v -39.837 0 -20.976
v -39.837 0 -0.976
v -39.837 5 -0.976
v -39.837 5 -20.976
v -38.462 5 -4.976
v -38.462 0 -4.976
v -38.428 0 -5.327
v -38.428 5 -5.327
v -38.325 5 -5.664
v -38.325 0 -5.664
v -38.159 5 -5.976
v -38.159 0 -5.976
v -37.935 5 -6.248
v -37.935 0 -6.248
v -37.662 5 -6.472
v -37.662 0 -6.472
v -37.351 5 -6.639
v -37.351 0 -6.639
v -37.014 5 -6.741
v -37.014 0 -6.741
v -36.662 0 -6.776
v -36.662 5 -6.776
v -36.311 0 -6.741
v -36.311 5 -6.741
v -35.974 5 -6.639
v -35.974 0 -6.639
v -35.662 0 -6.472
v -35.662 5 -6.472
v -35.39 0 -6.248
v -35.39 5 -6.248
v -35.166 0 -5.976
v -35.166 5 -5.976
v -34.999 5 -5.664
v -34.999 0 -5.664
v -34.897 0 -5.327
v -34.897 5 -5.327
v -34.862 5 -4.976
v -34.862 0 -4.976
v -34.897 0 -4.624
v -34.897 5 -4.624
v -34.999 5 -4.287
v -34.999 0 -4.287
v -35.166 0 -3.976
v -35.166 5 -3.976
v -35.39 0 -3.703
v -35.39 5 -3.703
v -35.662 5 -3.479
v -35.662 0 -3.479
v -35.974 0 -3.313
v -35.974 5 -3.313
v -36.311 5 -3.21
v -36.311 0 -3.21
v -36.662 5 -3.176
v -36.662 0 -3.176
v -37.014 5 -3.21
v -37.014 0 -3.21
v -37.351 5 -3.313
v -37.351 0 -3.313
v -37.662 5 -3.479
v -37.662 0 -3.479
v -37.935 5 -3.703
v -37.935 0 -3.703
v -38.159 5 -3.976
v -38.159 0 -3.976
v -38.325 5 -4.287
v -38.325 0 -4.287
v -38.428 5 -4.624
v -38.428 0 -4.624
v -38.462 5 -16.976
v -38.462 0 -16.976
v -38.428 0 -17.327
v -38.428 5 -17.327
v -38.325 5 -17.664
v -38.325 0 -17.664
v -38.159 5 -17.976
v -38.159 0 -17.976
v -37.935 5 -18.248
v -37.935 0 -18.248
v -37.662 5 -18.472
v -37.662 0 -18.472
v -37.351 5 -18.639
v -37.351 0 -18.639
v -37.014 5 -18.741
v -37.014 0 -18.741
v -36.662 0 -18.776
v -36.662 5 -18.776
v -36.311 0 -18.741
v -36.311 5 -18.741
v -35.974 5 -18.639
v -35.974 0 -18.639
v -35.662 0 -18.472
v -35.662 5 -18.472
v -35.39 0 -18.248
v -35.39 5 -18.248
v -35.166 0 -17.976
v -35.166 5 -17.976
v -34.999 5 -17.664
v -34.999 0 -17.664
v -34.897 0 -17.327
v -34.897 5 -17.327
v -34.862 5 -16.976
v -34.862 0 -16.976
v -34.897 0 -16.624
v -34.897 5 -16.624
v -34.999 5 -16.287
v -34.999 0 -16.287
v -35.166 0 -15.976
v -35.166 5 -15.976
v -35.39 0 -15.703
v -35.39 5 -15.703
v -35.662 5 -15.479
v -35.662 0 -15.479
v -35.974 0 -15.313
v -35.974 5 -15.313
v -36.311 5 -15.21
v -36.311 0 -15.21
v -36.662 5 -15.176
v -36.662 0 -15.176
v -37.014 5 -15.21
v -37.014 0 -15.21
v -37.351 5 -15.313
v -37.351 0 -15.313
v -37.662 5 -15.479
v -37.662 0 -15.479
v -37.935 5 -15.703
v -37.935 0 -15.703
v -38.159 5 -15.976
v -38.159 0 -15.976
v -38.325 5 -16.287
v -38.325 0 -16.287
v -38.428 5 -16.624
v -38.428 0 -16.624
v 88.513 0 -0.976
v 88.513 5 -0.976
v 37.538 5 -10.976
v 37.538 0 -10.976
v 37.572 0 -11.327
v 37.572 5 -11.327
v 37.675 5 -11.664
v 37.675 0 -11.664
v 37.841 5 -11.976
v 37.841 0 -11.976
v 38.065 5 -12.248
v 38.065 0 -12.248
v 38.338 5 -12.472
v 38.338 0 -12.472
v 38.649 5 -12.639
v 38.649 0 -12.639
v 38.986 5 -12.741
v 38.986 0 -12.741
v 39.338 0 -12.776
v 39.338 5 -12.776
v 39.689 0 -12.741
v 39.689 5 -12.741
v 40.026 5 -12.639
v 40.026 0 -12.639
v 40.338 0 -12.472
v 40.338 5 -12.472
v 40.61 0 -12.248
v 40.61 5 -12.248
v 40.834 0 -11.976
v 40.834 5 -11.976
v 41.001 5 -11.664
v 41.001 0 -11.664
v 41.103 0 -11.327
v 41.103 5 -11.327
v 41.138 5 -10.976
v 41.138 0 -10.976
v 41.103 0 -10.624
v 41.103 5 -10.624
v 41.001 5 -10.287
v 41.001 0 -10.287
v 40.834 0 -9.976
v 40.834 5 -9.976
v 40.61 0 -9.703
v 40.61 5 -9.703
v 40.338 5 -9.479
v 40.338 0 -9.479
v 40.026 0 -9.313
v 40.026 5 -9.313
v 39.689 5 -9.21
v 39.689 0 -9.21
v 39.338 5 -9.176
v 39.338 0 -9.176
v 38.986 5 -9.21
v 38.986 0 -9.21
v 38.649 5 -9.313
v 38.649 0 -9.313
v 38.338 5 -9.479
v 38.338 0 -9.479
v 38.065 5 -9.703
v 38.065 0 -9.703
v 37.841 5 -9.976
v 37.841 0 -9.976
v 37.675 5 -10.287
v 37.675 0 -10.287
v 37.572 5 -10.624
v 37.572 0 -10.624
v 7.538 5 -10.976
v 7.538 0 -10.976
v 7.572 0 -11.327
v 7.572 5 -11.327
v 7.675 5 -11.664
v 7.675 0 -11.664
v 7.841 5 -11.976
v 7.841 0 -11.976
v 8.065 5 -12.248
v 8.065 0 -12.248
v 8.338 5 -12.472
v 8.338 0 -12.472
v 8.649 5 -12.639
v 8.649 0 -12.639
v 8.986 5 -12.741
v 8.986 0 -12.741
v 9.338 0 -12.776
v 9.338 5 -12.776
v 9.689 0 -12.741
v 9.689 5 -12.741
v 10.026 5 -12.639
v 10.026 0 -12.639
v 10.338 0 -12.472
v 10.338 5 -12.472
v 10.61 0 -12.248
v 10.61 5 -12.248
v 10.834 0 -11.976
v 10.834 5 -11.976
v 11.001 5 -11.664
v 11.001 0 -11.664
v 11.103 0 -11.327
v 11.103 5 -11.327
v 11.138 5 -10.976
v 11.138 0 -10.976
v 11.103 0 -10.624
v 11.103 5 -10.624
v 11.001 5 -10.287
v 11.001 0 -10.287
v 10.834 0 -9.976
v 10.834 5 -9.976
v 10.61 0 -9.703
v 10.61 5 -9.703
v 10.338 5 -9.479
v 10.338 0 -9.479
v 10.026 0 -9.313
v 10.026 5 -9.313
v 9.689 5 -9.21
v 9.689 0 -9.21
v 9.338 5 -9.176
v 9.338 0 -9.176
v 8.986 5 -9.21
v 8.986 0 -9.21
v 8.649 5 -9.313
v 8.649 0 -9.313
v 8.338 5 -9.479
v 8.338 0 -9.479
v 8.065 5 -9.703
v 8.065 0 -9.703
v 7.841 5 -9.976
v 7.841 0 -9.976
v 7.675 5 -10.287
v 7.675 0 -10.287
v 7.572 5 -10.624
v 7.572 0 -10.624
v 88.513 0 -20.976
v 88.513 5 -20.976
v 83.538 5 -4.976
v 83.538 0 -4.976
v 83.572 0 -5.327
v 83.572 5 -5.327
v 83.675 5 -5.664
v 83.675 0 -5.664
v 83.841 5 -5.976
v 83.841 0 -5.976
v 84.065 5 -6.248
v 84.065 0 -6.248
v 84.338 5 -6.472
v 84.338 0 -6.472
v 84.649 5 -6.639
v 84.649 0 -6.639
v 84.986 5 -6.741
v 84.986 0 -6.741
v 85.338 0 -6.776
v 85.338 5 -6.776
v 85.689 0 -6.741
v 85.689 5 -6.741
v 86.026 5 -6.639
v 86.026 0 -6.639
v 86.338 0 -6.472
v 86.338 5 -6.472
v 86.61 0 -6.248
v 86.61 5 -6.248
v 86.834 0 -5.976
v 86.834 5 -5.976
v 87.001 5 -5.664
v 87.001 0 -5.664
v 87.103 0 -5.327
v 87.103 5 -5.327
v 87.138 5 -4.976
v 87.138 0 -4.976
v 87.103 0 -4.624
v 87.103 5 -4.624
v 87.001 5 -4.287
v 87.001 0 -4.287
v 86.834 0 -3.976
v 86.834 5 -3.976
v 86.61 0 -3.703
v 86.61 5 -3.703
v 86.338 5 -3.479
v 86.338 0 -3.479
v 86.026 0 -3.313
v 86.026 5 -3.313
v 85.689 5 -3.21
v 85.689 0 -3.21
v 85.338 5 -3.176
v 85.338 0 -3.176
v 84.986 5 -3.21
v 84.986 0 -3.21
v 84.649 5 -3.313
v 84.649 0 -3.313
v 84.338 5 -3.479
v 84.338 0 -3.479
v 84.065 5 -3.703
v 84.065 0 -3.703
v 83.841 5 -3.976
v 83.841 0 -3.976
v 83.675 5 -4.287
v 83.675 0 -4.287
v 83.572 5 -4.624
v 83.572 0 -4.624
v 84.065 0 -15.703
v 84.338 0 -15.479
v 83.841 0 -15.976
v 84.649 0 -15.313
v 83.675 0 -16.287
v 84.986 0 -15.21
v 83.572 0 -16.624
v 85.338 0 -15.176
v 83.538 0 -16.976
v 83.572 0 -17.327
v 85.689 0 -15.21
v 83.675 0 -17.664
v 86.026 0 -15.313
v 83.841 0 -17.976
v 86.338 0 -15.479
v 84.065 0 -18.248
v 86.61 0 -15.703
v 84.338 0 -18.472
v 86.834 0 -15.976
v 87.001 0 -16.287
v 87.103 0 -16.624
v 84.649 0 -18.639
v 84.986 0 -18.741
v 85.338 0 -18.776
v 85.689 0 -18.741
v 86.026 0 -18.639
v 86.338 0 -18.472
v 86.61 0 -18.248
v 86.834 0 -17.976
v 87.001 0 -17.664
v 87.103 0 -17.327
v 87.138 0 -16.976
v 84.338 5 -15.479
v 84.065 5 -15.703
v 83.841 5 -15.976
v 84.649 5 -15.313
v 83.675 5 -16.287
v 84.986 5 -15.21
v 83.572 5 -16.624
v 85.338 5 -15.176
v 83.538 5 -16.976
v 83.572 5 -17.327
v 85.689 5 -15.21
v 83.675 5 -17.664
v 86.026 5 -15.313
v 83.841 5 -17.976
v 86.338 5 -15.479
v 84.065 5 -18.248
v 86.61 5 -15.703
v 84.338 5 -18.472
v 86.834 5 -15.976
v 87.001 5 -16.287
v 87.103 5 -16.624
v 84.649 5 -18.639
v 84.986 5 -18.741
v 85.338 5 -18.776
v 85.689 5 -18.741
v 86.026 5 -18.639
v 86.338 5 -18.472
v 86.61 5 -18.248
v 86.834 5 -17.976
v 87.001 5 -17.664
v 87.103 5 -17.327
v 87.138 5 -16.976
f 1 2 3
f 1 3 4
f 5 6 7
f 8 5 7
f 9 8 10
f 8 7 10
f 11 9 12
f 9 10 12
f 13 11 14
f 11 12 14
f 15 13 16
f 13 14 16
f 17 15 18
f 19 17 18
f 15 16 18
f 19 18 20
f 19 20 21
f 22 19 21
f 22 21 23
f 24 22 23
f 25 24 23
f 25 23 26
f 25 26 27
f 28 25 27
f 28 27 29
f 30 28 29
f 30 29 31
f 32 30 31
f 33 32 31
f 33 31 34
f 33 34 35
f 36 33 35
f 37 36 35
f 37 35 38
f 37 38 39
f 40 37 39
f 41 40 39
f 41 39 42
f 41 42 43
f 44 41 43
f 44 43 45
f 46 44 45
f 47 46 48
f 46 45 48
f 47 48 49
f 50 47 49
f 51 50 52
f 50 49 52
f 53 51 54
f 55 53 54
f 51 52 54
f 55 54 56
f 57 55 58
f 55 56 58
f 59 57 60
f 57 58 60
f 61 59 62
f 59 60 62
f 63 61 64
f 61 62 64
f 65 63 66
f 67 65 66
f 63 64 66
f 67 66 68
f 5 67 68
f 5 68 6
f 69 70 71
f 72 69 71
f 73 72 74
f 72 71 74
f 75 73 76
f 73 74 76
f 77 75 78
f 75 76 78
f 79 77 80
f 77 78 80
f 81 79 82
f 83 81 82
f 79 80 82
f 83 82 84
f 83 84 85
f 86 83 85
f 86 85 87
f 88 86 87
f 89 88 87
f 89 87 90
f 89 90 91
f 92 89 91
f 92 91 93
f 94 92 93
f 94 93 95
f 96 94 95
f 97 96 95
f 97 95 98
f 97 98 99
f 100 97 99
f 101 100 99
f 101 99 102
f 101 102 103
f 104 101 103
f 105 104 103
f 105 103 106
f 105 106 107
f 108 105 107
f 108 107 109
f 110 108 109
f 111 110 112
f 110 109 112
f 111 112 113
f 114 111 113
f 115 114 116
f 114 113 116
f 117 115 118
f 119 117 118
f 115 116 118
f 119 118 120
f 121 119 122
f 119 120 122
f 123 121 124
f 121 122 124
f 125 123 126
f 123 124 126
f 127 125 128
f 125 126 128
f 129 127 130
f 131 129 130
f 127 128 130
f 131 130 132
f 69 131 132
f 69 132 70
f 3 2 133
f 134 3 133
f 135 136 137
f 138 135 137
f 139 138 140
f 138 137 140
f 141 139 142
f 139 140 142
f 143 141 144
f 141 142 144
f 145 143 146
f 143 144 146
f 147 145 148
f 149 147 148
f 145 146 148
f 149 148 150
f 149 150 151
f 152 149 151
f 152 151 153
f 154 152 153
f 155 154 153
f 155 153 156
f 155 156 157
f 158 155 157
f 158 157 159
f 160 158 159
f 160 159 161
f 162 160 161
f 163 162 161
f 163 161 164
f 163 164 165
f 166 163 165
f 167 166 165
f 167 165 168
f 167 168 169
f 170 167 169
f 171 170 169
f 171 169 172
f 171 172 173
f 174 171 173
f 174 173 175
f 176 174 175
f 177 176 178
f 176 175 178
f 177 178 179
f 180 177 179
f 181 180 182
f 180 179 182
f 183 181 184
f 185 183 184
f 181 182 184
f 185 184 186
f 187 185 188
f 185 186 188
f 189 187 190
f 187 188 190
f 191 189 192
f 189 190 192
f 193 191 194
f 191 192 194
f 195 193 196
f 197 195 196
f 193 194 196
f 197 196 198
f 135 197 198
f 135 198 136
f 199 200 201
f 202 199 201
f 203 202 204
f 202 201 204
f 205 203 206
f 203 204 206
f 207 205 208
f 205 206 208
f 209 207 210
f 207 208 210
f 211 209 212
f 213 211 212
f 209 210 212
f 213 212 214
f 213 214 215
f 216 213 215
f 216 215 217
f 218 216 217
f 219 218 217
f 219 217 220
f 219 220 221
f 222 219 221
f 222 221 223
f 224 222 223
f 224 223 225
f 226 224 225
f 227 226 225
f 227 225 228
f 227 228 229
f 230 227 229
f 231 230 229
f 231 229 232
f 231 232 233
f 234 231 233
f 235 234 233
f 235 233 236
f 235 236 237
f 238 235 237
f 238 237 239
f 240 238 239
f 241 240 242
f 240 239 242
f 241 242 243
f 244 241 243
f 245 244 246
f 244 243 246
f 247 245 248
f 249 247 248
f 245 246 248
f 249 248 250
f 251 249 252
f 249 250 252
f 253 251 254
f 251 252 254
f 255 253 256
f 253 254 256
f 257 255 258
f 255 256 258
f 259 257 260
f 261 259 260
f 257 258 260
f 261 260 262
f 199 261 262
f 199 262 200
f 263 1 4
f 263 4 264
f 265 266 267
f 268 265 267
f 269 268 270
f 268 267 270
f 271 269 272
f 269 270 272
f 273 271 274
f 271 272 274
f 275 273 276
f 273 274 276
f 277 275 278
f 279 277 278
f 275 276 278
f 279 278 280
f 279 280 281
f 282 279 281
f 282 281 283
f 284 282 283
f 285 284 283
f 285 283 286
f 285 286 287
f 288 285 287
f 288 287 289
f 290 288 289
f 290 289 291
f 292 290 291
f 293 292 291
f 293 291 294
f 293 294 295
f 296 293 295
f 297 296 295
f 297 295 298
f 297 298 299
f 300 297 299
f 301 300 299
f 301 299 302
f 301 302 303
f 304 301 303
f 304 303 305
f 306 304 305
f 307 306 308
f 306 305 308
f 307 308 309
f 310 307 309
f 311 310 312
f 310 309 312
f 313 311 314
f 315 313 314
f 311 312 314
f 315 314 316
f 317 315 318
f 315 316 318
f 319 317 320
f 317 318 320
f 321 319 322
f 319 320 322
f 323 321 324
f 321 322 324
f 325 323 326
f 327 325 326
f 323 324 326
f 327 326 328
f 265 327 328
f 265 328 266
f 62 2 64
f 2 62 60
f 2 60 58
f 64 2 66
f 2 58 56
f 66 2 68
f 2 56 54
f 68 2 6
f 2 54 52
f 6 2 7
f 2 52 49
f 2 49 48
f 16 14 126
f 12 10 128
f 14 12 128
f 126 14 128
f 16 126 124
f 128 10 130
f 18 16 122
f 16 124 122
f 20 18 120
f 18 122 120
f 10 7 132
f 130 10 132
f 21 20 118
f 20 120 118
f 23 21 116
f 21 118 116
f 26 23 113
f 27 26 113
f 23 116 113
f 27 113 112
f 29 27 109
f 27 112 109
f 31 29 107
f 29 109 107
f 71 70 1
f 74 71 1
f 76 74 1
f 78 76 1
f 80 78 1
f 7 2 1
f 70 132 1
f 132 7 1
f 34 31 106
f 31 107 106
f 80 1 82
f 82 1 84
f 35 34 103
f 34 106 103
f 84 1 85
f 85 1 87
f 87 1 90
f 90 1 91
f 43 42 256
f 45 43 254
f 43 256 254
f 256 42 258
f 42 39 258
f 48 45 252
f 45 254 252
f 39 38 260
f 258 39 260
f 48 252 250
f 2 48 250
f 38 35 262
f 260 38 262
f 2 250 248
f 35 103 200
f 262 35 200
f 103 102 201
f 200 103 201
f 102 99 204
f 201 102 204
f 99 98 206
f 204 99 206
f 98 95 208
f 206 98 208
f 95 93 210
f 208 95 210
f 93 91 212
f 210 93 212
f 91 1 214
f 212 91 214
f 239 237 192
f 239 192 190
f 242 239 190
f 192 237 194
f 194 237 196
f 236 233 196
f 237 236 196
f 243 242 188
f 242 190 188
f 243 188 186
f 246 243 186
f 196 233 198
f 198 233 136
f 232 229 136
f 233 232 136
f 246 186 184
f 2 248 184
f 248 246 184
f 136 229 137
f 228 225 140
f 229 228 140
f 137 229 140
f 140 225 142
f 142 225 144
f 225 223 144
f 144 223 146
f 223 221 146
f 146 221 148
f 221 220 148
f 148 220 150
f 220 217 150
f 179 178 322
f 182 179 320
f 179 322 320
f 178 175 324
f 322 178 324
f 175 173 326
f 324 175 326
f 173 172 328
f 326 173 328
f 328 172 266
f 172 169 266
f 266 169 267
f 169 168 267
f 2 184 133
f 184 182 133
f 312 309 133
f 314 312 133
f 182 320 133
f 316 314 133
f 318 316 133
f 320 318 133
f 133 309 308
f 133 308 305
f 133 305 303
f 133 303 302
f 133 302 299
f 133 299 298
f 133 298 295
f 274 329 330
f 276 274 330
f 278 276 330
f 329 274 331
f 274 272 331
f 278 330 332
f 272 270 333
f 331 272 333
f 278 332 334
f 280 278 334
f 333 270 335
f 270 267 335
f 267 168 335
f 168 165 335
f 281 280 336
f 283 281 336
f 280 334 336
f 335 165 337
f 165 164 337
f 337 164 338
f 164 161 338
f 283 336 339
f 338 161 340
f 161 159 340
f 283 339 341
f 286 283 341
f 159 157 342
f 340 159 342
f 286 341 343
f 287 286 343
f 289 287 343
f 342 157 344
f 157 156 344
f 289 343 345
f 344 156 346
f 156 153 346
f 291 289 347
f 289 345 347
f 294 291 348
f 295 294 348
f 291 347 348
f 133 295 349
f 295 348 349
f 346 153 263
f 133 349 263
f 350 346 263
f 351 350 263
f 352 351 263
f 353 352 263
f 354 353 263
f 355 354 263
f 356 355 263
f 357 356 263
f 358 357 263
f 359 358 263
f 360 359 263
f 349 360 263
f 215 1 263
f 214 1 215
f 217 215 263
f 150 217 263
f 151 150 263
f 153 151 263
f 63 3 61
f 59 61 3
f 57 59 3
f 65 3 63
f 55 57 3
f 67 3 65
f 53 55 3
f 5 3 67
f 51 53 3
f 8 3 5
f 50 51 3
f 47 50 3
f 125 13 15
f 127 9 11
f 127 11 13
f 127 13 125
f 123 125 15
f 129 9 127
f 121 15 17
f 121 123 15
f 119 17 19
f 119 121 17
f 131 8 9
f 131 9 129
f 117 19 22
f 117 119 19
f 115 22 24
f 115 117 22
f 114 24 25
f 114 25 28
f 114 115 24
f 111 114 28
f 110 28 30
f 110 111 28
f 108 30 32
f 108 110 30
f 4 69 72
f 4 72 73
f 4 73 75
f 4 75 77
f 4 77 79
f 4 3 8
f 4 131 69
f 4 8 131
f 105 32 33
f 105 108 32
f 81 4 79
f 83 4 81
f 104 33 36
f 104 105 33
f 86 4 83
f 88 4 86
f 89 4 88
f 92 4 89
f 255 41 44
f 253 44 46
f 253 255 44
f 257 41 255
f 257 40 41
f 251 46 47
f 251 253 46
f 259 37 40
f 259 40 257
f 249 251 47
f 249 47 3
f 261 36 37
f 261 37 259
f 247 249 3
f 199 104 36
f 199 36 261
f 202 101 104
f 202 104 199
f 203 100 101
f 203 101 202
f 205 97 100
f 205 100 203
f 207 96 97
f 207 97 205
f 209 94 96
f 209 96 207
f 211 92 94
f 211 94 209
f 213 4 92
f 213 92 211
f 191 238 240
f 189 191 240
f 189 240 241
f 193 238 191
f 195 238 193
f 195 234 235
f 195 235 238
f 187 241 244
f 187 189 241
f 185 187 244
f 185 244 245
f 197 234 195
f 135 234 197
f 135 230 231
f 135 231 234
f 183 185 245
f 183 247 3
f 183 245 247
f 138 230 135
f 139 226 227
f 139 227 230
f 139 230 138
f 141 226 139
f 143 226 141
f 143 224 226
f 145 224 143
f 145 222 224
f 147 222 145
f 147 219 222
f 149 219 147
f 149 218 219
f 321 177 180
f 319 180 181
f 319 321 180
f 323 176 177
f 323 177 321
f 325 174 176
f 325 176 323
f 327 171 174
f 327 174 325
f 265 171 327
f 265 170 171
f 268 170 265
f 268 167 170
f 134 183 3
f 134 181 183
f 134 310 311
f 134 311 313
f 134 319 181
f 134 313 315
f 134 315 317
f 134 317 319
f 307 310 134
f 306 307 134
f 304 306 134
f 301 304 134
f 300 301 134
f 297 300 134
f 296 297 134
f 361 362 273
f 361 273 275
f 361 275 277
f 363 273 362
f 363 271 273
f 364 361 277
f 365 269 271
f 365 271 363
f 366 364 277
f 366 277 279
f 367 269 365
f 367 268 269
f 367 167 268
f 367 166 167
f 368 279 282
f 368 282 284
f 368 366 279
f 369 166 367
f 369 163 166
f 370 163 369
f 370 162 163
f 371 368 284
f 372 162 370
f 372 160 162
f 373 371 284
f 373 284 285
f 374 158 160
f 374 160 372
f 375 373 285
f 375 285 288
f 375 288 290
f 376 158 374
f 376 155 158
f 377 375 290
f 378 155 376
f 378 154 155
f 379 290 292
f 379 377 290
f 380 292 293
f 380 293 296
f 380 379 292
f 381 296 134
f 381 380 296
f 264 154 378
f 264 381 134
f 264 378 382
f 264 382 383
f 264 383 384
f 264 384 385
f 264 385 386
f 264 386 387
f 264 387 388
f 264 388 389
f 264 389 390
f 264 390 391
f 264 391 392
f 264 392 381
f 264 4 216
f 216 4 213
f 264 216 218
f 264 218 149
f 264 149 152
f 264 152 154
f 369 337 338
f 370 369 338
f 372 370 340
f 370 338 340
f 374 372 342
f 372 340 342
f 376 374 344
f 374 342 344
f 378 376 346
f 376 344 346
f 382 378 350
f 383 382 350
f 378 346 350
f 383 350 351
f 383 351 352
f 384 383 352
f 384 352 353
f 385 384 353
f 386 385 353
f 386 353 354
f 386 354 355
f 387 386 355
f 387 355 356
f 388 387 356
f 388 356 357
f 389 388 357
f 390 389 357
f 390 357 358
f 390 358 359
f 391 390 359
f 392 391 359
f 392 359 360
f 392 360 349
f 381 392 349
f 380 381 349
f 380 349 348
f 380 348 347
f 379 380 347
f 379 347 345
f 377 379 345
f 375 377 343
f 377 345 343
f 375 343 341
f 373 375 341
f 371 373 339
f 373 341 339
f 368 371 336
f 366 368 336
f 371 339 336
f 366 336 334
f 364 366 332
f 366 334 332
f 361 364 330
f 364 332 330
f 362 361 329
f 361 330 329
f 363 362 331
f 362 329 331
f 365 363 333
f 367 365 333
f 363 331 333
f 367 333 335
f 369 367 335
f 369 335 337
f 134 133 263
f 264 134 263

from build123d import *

# Parameters (mm, degrees)
SKETCH2_W            = 128.35
SKETCH2_H            = 20
BOSS_EXTRUDE1_DEPTH  = 5
M3_CLEARANCE_HOLE1_D = 3.6
M3_CLEARANCE_HOLE2_D = 3.6


with BuildPart() as part:
    # Sketch2 → Boss-Extrude1 (new body)
    with BuildSketch(Plane(origin=(0, 0, 0), x_dir=(1, 0, 0), z_dir=(0, 1, 0))):
        with Locations((24.337601626, 10.975609756)):
            Rectangle(SKETCH2_W, SKETCH2_H)
    extrude(amount=BOSS_EXTRUDE1_DEPTH)

    # M3 Clearance Hole1 (through all)
    with Locations(Plane(origin=(0, 5, 0), x_dir=(1, 0, 0), z_dir=(0, 1, 0))):
        with Locations((-36.662398374, 16.975609756), (-36.662398374, 4.975609756), (85.337601626, 16.975609756), (85.337601626, 4.975609756)):
            Hole(M3_CLEARANCE_HOLE1_D / 2)

    # M3 Clearance Hole2 (through all)
    with Locations(Plane(origin=(0, 5, 0), x_dir=(1, 0, 0), z_dir=(0, 1, 0))):
        with Locations((9.337601626, 10.975609756), (39.337601626, 10.975609756)):
            Hole(M3_CLEARANCE_HOLE2_D / 2)


solid = part.part
